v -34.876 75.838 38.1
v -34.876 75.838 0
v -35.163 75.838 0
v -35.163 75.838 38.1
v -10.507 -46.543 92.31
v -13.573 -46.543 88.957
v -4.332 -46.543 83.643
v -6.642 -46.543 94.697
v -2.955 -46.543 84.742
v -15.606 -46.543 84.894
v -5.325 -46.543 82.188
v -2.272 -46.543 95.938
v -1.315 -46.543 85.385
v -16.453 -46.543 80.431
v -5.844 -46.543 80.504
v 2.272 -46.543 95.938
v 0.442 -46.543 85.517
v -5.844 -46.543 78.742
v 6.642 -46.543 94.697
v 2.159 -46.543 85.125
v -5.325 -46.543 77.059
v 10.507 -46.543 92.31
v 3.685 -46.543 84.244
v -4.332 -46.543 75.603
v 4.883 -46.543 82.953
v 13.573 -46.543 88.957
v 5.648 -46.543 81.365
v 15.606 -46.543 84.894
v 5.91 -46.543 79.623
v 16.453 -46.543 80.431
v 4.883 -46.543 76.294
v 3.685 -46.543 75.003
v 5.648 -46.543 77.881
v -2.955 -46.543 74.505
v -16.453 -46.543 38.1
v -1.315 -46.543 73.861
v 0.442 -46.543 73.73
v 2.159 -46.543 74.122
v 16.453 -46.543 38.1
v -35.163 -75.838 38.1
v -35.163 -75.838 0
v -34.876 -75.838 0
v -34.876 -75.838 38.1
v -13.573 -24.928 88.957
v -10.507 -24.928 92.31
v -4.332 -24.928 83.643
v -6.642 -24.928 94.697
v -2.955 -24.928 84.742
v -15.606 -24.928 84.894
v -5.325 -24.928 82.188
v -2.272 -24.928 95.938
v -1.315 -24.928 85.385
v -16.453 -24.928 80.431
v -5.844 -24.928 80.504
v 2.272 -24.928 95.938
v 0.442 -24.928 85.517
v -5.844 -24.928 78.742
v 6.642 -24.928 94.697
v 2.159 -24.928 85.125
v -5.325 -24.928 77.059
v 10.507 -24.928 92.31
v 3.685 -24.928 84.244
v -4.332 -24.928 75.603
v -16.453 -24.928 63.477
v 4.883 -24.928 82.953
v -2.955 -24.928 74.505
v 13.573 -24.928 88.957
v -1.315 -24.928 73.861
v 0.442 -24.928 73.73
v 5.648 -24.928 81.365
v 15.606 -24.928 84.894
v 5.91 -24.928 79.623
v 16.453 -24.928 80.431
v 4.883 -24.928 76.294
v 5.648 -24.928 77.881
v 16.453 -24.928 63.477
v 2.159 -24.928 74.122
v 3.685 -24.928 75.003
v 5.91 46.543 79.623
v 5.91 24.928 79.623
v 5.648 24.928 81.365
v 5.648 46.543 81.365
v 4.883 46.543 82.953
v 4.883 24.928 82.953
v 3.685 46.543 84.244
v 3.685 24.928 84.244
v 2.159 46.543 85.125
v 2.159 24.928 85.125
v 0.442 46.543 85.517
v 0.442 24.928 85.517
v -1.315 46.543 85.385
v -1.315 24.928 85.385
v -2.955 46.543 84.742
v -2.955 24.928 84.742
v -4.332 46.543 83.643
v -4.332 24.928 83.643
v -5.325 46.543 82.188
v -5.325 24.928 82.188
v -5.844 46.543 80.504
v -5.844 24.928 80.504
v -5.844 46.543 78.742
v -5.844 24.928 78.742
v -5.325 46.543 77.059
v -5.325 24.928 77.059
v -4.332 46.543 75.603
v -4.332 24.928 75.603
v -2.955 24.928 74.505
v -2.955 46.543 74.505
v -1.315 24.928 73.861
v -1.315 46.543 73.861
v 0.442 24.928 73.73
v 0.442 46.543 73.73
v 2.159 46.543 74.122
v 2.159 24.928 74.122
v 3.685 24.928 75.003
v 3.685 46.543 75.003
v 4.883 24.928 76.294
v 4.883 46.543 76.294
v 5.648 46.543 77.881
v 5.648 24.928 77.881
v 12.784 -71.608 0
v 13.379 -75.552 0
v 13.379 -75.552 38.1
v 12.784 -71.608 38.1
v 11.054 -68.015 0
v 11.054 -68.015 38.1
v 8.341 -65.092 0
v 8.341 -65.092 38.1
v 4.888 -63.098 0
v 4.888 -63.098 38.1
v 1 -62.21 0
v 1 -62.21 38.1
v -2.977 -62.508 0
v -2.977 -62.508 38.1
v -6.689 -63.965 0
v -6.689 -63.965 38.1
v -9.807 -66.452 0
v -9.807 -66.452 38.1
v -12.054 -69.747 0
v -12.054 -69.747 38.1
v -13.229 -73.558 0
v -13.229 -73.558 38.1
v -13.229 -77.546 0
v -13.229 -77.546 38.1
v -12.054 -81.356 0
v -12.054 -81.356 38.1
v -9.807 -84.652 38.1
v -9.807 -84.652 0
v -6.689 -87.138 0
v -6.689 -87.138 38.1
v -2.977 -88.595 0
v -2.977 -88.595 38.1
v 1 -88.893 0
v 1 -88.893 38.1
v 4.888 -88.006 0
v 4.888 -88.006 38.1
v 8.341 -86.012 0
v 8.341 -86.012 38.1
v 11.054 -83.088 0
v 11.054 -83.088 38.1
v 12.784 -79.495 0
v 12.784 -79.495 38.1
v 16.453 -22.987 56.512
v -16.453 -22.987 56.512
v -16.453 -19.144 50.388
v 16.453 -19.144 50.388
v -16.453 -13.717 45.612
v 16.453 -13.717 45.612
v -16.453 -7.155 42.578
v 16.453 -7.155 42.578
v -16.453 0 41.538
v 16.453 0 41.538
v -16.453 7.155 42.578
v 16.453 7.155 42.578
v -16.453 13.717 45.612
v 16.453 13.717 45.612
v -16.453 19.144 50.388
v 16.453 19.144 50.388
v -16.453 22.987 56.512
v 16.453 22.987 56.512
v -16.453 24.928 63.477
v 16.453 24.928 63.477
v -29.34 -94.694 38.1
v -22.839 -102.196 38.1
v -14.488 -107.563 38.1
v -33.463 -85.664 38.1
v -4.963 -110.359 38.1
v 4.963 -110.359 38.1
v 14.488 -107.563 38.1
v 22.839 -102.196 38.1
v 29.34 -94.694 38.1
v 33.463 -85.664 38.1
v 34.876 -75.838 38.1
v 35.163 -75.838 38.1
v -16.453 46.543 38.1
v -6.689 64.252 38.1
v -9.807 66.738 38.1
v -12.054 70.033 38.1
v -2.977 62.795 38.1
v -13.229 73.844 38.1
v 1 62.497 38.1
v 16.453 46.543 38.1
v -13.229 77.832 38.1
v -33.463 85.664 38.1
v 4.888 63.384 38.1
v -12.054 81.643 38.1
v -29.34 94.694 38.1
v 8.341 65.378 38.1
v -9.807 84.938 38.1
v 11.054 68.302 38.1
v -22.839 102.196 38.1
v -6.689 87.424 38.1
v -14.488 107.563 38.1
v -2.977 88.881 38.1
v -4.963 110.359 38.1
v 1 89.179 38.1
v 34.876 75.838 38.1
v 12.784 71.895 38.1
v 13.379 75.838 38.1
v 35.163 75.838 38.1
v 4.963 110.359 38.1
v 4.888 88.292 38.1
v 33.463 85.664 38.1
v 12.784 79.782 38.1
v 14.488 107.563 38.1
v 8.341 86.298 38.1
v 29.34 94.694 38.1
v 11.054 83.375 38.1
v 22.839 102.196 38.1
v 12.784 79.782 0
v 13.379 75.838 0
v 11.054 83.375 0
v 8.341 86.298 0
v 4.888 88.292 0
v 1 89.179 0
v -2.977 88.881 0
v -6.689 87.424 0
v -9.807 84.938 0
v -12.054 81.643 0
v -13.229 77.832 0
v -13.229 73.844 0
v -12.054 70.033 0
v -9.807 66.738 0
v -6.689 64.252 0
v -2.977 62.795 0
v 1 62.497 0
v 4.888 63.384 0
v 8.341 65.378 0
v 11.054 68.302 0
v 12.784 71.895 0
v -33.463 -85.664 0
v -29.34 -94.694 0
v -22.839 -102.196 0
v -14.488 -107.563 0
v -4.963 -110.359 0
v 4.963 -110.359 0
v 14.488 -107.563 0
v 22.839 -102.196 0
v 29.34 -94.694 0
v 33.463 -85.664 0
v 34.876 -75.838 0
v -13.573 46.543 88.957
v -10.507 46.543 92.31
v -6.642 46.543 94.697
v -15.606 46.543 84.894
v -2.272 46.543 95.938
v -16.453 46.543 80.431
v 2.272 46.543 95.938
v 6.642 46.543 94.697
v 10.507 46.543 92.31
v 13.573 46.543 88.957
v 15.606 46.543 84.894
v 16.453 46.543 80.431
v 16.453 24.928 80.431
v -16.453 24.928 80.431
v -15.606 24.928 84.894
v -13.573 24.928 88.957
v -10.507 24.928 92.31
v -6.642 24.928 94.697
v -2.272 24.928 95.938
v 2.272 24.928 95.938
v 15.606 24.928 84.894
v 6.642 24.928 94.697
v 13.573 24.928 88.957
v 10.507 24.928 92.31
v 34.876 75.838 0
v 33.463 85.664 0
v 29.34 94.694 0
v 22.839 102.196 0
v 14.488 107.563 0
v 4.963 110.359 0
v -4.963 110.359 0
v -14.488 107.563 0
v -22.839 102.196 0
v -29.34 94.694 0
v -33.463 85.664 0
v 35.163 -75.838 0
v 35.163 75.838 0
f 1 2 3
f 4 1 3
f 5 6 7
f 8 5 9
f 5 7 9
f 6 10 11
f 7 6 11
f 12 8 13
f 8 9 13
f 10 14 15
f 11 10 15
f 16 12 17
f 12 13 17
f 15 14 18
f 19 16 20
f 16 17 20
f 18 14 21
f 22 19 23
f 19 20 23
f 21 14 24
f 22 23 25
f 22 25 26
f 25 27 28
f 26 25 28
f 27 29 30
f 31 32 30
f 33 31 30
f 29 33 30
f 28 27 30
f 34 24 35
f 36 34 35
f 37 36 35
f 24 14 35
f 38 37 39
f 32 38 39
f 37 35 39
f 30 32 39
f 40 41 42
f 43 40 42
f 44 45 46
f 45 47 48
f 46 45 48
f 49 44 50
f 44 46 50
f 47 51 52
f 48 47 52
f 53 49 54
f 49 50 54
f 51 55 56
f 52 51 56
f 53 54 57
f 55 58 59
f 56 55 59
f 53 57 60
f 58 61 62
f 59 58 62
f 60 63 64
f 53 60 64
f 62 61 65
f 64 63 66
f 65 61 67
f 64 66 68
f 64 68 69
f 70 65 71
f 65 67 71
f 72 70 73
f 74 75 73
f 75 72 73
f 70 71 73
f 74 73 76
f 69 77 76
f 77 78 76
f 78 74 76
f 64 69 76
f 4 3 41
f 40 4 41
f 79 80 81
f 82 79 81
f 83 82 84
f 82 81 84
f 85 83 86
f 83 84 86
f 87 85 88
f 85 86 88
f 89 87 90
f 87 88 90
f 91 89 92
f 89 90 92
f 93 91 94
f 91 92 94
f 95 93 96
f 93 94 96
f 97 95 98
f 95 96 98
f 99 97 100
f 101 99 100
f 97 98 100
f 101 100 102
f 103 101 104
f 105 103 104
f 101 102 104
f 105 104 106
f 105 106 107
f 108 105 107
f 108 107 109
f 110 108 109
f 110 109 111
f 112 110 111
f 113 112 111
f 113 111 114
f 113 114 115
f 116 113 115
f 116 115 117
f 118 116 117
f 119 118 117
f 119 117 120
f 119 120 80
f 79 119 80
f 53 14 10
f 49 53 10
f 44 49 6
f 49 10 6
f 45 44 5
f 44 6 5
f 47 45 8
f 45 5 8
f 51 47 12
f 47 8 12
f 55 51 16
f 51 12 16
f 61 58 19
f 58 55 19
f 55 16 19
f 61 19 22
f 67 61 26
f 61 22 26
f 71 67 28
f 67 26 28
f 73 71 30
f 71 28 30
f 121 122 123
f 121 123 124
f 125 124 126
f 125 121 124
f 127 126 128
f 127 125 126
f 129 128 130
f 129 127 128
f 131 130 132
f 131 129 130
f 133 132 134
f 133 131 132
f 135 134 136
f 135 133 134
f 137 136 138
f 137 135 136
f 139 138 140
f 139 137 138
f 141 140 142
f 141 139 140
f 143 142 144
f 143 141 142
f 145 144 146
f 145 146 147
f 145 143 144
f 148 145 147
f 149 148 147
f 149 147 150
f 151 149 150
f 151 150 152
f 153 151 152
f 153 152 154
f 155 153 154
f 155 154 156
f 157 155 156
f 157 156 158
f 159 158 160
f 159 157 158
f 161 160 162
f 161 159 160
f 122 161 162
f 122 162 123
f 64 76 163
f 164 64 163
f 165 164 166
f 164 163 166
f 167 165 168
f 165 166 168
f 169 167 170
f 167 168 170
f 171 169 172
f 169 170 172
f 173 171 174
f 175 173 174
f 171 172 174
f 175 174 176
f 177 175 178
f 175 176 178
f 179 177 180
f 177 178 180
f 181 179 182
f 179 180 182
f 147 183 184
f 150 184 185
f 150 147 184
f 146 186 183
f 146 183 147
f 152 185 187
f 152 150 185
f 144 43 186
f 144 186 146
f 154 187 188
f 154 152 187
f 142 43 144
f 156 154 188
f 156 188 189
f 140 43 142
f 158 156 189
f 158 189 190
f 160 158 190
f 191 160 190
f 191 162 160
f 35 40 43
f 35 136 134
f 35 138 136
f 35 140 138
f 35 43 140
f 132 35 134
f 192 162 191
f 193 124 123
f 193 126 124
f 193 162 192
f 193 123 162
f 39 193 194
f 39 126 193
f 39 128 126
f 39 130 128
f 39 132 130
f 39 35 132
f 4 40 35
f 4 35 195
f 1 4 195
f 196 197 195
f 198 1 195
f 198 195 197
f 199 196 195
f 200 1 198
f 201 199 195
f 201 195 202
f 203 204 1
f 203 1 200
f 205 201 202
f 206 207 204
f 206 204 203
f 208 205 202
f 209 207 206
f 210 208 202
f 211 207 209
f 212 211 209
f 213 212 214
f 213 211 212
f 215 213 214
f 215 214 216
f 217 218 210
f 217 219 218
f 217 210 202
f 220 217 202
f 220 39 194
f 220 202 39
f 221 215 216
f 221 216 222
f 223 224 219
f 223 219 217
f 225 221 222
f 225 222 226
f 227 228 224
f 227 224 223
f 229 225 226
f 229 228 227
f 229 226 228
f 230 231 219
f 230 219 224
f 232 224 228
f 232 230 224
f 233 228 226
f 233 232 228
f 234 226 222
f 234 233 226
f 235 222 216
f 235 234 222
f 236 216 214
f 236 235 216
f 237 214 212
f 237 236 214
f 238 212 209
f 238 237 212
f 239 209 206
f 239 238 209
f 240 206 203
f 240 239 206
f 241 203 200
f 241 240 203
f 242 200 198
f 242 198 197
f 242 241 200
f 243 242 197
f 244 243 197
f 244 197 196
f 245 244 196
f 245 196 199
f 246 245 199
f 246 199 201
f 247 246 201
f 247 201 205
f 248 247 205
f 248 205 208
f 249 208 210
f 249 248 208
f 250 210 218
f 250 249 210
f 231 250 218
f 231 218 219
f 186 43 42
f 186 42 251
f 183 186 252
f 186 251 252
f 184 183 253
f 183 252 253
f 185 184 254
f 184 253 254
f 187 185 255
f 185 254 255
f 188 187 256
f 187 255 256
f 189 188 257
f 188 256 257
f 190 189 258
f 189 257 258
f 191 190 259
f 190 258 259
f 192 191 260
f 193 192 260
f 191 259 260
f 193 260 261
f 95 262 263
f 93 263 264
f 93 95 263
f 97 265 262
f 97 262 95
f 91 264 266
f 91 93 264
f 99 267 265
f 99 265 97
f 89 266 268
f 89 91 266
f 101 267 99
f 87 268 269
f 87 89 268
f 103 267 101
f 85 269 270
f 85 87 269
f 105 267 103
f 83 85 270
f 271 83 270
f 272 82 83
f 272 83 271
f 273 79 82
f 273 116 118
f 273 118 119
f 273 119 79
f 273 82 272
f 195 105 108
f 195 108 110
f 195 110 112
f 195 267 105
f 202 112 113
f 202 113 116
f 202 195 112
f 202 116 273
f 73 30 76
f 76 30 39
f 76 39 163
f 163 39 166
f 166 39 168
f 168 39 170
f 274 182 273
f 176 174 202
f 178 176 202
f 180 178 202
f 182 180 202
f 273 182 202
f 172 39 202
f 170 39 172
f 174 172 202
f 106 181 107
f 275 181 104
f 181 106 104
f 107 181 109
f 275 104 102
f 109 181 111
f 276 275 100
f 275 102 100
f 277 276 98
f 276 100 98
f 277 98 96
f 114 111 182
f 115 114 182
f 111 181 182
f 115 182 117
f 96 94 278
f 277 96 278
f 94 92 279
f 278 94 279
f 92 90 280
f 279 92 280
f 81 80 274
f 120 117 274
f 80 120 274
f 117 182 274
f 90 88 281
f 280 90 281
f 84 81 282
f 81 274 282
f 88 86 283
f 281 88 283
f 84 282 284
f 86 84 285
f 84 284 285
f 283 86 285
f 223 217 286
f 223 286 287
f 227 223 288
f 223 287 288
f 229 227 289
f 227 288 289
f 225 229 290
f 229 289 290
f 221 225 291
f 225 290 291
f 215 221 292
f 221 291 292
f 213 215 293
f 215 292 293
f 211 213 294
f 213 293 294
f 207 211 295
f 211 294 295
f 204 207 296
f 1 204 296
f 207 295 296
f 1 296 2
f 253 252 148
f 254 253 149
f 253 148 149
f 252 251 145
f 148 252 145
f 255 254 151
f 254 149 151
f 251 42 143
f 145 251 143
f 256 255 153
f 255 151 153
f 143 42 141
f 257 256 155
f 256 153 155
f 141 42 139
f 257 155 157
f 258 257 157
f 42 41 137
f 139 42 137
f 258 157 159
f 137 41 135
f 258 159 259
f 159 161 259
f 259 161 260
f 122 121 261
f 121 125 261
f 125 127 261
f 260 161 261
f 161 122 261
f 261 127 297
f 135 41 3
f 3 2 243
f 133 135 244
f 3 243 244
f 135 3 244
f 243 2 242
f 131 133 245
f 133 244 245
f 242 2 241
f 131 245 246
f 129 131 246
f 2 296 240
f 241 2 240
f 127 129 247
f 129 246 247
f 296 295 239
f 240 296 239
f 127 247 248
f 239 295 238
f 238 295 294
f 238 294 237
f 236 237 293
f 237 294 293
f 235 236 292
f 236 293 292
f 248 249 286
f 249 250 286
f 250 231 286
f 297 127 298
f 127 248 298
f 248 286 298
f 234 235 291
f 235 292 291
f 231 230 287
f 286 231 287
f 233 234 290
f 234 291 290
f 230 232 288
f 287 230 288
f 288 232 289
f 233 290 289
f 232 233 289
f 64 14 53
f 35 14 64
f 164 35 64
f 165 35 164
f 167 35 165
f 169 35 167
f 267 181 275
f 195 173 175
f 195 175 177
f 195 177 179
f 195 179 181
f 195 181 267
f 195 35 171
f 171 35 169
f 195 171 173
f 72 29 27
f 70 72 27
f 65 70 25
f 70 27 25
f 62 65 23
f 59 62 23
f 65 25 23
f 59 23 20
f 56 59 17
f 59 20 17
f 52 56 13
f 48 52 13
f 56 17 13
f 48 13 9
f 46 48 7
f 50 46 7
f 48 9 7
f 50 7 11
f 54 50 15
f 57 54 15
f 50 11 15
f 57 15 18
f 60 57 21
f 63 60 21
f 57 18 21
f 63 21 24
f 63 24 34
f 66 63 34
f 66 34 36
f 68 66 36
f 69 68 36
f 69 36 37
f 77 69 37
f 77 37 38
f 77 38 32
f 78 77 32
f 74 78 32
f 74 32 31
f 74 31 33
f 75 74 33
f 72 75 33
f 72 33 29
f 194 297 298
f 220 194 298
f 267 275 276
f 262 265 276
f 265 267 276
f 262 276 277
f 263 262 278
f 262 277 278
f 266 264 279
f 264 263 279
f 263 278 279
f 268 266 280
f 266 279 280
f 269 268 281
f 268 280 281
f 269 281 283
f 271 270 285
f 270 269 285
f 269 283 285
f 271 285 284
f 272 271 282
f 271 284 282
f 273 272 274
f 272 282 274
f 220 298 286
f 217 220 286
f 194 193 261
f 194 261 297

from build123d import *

# Parameters (mm, degrees)
F0_R     = 13.378709
F1_DEPTH = 38.1
F2_W     = 32.905034
F2_H     = 93.086616
F3_DEPTH = 63.5
F4_R     = 5.910106
F5_DEPTH = 157.258617
F6_W     = 49.855356
F6_H     = 31.583474
F7_DEPTH = 51.616201


with BuildPart() as f1:
    # F0 (on Top) → F1 (new body)
    with BuildSketch(Plane.XY):
        with BuildLine():
            Line((-34.876153, 75.838156), (-35.162684, 75.838156))
            Line((-35.162684, 75.838156), (-35.162684, -75.838156))
            Line((-35.162684, -75.838156), (-34.876156, -75.838156))
            ThreePointArc((-34.876156, -75.838156), (-3e-06, -110.714309), (34.87615, -75.838156))
            Line((34.87615, -75.838156), (35.162684, -75.838156))
            Line((35.162684, -75.838156), (35.162684, 75.838156))
            Line((35.162684, 75.838156), (34.876153, 75.838156))
            ThreePointArc((34.876153, 75.838156), (0, 110.714309), (-34.876153, 75.838156))
        make_face()
        with Locations((-2e-06, -75.551689)):
            Circle(F0_R, mode=Mode.SUBTRACT)
        with Locations((0, 75.838156)):
            Circle(F0_R, mode=Mode.SUBTRACT)
    extrude(amount=F1_DEPTH)

    # F2 (on face) → F3 (join)
    with BuildSketch(Plane.XY.offset(38.1)):
        Rectangle(F2_W, F2_H)
    extrude(amount=F3_DEPTH)

    # F4 (on face) → F5 (cut, through all)
    with BuildSketch(Plane.XZ.offset(46.543308)):
        with BuildLine():
            ThreePointArc((-16.452517, 80.430904), (0, 96.095652), (16.452517, 80.430904))
            Line((16.452517, 80.430904), (16.452517, 101.6))
            Line((16.452517, 101.6), (-16.452517, 101.6))
            Line((-16.452517, 101.6), (-16.452517, 80.430904))
        make_face()
        with Locations((0, 79.623327)):
            Circle(F4_R)
    extrude(amount=-F5_DEPTH, mode=Mode.SUBTRACT)

    # F6 (on face) → F7 (cut, through all)
    with BuildSketch(Plane.YZ.offset(16.452517)):
        with BuildLine():
            Line((24.927678, 80.430904), (-24.927678, 80.430904))
            Line((-24.927678, 80.430904), (-24.927678, 63.47666))
            ThreePointArc((-24.927678, 63.47666), (0, 41.538121), (24.927678, 63.47666))
            Line((24.927678, 63.47666), (24.927678, 80.430904))
        make_face()
        with Locations((0, 96.222641)):
            Rectangle(F6_W, F6_H)
    extrude(amount=-F7_DEPTH, mode=Mode.SUBTRACT)


solid = f1.part
